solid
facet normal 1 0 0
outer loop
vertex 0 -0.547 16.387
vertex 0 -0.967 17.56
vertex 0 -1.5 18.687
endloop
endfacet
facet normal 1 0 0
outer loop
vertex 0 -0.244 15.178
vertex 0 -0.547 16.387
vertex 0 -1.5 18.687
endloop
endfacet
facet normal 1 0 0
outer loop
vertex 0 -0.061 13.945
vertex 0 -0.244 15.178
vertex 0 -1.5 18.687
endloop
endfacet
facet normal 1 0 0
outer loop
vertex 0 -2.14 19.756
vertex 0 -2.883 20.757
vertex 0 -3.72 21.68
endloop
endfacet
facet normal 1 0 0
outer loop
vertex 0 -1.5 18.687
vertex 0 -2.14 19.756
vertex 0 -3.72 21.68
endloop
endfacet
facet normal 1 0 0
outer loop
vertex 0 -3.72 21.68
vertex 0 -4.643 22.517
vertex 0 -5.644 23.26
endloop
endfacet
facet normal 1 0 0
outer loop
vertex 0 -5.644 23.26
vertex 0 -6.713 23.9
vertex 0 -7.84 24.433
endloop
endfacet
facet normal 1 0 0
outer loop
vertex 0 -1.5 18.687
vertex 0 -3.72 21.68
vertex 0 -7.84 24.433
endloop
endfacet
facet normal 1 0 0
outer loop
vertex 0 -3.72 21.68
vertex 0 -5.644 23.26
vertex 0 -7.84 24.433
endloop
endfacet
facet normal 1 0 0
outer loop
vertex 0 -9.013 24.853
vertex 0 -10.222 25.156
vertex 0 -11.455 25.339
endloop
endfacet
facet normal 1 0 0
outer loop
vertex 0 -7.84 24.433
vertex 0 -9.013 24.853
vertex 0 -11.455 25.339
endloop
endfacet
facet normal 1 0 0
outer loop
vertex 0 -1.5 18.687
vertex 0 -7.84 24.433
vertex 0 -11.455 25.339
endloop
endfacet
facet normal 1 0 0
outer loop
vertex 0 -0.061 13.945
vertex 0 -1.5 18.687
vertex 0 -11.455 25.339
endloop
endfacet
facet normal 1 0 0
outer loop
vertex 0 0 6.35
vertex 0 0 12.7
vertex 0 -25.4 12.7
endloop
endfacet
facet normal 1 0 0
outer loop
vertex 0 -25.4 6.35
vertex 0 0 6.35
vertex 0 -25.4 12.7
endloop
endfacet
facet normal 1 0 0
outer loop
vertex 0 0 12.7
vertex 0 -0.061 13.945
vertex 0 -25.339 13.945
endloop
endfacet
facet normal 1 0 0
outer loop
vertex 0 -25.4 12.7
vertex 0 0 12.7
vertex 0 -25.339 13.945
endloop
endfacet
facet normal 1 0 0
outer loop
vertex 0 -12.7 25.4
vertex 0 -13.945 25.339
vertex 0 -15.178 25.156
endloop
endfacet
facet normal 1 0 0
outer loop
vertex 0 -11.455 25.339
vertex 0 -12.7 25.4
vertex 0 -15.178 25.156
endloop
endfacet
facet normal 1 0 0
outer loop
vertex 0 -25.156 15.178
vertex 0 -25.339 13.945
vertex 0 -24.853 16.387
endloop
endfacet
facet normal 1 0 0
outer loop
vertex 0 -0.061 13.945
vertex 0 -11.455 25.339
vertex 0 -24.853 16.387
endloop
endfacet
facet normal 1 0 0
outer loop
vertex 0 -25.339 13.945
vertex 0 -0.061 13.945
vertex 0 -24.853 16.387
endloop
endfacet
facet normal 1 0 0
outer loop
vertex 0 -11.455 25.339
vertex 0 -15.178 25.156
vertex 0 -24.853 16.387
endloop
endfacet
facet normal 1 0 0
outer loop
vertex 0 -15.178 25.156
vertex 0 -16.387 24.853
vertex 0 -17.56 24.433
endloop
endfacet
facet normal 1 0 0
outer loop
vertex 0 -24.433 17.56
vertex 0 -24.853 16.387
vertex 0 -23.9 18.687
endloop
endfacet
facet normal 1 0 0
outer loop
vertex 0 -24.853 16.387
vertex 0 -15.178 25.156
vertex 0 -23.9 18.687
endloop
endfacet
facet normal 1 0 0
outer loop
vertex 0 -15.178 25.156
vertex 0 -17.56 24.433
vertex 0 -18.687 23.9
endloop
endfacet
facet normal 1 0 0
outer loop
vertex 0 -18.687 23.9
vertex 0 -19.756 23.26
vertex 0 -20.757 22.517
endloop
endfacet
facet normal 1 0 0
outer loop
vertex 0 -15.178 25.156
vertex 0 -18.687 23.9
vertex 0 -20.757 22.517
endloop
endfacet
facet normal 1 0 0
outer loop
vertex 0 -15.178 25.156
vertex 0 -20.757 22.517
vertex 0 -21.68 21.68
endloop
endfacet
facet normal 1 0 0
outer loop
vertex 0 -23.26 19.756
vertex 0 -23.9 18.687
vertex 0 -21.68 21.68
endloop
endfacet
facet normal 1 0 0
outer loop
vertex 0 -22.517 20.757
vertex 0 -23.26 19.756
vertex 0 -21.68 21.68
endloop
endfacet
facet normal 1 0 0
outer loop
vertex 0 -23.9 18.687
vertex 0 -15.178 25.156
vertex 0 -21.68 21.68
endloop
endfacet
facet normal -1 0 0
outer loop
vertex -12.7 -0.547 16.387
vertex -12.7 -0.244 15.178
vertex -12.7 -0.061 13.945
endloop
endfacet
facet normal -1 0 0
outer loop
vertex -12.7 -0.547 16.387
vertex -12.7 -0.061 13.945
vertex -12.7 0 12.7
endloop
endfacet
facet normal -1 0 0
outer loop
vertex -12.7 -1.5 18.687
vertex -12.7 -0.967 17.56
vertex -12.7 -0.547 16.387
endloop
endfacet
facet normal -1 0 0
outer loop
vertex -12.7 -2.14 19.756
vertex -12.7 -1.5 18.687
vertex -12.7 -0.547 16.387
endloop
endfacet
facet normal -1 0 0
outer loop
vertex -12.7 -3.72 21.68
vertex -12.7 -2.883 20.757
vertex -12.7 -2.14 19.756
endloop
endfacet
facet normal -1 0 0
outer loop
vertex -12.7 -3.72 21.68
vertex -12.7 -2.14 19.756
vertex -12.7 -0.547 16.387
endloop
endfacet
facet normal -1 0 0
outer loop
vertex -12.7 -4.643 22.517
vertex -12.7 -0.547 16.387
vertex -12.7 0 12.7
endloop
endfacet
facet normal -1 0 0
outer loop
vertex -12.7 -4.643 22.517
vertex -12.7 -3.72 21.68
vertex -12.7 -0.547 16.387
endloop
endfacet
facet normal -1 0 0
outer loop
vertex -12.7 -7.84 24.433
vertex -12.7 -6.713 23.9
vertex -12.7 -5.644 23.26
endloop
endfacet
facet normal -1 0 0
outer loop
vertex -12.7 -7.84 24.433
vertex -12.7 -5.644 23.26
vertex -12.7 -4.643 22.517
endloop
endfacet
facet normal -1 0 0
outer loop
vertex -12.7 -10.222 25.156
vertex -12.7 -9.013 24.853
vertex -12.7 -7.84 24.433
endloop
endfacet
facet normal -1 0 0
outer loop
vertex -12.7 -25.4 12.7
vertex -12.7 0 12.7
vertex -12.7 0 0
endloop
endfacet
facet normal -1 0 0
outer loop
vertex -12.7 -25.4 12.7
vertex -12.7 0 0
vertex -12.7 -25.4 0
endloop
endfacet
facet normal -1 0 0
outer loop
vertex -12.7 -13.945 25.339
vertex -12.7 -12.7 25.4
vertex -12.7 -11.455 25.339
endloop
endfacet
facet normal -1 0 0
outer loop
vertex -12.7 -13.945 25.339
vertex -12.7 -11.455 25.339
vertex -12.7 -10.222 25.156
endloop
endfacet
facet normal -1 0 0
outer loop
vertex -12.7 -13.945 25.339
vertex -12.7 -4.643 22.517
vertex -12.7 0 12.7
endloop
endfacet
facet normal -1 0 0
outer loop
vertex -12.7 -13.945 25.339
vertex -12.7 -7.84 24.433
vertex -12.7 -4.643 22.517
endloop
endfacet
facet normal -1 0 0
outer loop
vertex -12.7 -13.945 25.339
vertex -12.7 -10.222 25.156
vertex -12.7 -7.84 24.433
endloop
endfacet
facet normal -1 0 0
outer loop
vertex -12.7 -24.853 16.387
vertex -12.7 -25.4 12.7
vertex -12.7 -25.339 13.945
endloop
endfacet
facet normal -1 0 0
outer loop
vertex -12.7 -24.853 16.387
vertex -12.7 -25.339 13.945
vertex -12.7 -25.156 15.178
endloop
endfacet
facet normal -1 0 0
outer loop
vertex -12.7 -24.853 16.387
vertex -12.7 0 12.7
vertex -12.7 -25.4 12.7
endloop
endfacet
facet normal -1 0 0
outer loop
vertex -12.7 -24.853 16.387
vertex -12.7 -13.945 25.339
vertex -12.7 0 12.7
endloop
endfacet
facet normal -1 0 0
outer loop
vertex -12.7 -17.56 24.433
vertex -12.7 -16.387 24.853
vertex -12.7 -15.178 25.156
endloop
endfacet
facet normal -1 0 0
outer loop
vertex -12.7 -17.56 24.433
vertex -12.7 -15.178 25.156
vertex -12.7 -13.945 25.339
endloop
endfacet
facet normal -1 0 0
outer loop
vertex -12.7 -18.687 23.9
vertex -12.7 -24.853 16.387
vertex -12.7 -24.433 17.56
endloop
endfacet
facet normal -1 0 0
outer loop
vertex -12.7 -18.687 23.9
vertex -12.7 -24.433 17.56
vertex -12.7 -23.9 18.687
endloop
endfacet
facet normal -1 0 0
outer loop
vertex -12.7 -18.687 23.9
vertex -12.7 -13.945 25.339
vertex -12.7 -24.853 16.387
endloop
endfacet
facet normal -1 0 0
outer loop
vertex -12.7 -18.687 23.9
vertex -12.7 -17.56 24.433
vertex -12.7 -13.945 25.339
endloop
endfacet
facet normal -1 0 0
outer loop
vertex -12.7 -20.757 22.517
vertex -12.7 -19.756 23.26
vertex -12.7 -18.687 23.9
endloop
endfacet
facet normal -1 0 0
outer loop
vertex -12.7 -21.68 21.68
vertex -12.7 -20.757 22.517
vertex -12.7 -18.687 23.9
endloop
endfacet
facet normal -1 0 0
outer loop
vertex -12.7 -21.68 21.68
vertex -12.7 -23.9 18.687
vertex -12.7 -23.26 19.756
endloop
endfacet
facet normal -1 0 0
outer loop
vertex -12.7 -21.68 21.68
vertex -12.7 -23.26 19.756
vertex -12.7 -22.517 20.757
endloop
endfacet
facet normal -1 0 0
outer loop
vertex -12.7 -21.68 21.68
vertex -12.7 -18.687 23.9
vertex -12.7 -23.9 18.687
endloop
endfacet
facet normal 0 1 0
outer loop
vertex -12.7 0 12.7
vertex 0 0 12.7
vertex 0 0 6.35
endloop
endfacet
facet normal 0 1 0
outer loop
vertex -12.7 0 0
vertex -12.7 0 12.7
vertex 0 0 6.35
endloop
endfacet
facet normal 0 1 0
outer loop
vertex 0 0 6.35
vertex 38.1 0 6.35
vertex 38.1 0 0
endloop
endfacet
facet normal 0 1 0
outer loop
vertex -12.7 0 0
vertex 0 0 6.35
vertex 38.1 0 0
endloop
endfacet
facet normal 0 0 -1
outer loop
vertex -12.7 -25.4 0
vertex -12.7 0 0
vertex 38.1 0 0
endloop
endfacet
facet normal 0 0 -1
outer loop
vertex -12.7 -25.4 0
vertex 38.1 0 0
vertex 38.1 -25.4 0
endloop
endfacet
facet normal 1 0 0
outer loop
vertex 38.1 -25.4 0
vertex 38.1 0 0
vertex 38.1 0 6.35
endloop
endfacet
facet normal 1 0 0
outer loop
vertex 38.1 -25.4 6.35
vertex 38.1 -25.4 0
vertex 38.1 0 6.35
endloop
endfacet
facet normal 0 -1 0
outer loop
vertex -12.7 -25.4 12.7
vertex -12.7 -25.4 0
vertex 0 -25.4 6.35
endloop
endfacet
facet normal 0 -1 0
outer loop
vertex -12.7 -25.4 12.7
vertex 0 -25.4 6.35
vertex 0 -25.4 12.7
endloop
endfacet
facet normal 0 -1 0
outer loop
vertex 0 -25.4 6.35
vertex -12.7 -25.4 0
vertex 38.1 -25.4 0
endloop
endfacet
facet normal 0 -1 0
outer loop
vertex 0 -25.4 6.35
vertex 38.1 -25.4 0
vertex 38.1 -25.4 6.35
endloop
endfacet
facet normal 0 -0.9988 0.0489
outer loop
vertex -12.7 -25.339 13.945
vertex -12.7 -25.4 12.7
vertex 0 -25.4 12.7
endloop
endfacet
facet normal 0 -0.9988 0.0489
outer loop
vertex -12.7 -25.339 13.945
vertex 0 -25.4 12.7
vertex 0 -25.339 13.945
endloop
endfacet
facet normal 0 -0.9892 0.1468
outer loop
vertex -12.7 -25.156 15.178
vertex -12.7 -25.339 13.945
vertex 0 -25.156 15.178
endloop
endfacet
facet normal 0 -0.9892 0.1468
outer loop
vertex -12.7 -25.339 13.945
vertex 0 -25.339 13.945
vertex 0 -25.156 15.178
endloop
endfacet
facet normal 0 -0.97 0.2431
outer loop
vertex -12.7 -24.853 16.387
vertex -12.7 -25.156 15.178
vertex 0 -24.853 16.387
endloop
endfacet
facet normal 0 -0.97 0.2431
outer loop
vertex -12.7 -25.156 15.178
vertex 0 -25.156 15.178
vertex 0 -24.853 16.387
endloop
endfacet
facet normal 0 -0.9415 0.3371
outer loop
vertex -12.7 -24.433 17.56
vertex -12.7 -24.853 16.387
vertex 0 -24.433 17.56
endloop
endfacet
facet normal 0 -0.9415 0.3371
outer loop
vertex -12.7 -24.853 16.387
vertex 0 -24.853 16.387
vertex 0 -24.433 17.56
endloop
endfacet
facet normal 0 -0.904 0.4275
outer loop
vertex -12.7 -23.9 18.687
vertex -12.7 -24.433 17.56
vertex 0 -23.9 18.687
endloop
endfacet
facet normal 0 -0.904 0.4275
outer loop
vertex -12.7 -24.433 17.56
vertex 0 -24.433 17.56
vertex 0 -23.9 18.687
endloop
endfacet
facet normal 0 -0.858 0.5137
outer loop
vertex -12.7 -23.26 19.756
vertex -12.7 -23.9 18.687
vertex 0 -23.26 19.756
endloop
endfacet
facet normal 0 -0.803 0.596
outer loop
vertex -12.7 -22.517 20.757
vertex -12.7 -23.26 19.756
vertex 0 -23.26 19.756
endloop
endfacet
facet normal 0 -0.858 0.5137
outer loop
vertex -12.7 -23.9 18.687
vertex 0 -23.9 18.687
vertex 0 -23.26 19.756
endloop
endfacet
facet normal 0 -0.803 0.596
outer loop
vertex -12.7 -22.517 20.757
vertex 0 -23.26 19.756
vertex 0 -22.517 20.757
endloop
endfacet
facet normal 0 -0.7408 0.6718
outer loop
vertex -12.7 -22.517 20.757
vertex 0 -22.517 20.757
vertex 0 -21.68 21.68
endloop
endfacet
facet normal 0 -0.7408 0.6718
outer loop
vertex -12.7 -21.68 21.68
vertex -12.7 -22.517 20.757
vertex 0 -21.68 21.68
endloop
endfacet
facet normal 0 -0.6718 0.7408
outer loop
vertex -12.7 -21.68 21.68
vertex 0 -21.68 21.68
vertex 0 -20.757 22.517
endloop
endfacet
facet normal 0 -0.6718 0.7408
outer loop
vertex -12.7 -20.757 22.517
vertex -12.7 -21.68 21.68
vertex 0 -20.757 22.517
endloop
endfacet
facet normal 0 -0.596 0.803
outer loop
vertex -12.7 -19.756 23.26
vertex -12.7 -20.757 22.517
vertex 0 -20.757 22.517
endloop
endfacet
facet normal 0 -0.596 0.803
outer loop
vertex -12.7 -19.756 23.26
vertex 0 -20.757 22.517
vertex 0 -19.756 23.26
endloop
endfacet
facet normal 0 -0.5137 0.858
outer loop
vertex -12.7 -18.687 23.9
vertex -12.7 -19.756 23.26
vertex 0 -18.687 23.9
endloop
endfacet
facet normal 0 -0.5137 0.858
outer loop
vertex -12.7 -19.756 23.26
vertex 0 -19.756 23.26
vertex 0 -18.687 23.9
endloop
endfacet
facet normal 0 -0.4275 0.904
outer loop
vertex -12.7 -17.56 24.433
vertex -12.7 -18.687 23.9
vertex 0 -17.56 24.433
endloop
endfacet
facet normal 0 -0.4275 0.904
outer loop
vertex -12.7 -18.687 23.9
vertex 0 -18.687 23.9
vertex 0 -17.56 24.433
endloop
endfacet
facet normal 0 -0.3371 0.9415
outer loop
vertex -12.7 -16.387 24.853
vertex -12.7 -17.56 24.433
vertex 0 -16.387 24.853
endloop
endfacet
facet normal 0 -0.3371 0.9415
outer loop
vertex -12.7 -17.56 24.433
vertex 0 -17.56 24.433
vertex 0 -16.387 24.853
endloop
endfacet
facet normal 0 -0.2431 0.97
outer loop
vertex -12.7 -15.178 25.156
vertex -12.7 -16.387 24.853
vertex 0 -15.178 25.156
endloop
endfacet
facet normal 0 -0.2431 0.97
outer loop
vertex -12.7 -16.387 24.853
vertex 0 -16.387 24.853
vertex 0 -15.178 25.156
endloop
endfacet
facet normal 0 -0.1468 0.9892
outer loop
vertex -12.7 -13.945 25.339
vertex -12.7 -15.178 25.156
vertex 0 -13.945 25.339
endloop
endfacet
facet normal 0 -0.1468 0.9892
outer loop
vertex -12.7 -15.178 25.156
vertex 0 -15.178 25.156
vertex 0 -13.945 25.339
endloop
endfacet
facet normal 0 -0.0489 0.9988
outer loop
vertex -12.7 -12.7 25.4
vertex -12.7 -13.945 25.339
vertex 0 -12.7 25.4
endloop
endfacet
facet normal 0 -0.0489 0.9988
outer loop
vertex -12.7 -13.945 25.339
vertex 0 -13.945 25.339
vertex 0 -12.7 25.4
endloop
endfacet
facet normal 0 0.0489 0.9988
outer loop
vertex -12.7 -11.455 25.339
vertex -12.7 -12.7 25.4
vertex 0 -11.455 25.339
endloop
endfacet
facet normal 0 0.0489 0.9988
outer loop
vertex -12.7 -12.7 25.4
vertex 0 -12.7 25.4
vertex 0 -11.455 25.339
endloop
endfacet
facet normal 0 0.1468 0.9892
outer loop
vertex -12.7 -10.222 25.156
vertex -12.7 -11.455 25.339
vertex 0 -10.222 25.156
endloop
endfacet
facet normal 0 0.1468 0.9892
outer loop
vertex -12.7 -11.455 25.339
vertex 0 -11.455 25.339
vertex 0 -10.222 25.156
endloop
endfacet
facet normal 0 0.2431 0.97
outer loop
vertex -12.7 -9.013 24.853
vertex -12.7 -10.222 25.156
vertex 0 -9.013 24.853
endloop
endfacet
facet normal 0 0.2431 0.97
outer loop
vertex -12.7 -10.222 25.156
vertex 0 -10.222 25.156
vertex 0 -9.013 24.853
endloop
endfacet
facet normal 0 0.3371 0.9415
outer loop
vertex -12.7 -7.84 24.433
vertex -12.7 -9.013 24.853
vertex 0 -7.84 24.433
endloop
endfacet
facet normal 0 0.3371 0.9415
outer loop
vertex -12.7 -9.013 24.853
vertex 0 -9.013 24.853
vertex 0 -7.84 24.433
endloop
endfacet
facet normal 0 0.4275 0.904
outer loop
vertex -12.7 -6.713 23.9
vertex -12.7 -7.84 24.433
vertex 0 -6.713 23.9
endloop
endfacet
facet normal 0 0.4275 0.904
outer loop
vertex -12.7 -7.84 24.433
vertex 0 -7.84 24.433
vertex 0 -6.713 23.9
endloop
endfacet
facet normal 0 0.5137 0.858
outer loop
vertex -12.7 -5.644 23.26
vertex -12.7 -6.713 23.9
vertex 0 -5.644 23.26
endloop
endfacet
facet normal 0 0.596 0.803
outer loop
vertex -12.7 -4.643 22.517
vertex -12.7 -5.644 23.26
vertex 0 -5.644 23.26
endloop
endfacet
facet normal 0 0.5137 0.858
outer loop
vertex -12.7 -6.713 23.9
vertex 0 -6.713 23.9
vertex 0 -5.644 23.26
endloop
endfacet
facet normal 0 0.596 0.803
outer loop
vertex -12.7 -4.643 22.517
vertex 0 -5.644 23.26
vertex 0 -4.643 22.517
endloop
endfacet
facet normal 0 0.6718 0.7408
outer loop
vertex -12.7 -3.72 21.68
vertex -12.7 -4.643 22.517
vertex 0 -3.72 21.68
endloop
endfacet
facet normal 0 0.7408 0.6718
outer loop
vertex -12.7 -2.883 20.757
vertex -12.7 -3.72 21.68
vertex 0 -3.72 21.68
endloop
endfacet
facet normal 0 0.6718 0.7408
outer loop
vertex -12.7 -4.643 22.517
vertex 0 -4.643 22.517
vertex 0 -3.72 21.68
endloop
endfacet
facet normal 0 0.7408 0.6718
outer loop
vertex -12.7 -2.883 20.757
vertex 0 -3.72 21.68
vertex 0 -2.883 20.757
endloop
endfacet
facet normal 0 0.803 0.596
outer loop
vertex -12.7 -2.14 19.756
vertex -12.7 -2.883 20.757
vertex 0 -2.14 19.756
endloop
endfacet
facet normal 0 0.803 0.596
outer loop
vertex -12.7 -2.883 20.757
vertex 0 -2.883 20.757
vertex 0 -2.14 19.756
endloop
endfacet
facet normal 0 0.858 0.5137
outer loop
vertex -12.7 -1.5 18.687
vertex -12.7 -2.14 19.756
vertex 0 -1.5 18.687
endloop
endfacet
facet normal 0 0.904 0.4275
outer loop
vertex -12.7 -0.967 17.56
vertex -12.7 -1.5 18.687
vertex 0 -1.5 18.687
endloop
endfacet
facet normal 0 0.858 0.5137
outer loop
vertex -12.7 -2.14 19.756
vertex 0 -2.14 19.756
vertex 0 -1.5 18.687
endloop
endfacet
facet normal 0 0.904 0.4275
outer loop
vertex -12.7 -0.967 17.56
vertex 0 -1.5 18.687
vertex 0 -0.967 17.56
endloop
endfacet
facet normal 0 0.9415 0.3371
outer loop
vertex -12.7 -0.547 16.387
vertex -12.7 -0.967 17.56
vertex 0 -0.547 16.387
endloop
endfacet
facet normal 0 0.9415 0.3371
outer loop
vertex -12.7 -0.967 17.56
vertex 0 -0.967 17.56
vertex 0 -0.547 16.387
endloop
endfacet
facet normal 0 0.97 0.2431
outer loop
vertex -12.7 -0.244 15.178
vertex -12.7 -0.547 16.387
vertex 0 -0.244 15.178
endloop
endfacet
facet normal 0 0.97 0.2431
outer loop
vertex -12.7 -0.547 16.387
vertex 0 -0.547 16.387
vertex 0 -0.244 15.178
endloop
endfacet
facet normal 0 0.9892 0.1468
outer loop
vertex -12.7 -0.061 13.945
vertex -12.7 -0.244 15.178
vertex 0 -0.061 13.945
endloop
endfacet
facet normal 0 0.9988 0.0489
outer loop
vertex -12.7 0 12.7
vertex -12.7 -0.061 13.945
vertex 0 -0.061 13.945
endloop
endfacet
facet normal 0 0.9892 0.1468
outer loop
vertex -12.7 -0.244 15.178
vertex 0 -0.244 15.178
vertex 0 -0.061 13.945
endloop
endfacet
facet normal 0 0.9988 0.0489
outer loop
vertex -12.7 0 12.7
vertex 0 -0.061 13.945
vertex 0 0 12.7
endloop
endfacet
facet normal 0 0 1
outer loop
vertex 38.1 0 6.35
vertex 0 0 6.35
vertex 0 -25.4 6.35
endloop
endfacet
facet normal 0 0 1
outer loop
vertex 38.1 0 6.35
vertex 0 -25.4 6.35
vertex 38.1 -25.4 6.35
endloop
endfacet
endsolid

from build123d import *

# Parameters (mm, degrees)
F0_W     = 38.1
F0_H     = 6.35
F1_DEPTH = 25.4
F3_DEPTH = 12.7


with BuildPart() as f1:
    # F0 (on Front) → F1 (new body)
    with BuildSketch(Plane.XZ):
        with Locations((19.05, 3.175)):
            Rectangle(F0_W, F0_H)
    extrude(amount=F1_DEPTH)

    # F2 (on face) → F3 (join)
    with BuildSketch(Plane(origin=(0, 0, 0), x_dir=(0, -1, 0), z_dir=(-1, 0, 0))):
        with BuildLine():
            Line((0, 12.7), (0, 0))
            Line((0, 0), (25.4, 0))
            Line((25.4, 0), (25.4, 12.7))
            ThreePointArc((25.4, 12.7), (12.7, 25.4), (0, 12.7))
        make_face()
    extrude(amount=F3_DEPTH)


solid = f1.part
